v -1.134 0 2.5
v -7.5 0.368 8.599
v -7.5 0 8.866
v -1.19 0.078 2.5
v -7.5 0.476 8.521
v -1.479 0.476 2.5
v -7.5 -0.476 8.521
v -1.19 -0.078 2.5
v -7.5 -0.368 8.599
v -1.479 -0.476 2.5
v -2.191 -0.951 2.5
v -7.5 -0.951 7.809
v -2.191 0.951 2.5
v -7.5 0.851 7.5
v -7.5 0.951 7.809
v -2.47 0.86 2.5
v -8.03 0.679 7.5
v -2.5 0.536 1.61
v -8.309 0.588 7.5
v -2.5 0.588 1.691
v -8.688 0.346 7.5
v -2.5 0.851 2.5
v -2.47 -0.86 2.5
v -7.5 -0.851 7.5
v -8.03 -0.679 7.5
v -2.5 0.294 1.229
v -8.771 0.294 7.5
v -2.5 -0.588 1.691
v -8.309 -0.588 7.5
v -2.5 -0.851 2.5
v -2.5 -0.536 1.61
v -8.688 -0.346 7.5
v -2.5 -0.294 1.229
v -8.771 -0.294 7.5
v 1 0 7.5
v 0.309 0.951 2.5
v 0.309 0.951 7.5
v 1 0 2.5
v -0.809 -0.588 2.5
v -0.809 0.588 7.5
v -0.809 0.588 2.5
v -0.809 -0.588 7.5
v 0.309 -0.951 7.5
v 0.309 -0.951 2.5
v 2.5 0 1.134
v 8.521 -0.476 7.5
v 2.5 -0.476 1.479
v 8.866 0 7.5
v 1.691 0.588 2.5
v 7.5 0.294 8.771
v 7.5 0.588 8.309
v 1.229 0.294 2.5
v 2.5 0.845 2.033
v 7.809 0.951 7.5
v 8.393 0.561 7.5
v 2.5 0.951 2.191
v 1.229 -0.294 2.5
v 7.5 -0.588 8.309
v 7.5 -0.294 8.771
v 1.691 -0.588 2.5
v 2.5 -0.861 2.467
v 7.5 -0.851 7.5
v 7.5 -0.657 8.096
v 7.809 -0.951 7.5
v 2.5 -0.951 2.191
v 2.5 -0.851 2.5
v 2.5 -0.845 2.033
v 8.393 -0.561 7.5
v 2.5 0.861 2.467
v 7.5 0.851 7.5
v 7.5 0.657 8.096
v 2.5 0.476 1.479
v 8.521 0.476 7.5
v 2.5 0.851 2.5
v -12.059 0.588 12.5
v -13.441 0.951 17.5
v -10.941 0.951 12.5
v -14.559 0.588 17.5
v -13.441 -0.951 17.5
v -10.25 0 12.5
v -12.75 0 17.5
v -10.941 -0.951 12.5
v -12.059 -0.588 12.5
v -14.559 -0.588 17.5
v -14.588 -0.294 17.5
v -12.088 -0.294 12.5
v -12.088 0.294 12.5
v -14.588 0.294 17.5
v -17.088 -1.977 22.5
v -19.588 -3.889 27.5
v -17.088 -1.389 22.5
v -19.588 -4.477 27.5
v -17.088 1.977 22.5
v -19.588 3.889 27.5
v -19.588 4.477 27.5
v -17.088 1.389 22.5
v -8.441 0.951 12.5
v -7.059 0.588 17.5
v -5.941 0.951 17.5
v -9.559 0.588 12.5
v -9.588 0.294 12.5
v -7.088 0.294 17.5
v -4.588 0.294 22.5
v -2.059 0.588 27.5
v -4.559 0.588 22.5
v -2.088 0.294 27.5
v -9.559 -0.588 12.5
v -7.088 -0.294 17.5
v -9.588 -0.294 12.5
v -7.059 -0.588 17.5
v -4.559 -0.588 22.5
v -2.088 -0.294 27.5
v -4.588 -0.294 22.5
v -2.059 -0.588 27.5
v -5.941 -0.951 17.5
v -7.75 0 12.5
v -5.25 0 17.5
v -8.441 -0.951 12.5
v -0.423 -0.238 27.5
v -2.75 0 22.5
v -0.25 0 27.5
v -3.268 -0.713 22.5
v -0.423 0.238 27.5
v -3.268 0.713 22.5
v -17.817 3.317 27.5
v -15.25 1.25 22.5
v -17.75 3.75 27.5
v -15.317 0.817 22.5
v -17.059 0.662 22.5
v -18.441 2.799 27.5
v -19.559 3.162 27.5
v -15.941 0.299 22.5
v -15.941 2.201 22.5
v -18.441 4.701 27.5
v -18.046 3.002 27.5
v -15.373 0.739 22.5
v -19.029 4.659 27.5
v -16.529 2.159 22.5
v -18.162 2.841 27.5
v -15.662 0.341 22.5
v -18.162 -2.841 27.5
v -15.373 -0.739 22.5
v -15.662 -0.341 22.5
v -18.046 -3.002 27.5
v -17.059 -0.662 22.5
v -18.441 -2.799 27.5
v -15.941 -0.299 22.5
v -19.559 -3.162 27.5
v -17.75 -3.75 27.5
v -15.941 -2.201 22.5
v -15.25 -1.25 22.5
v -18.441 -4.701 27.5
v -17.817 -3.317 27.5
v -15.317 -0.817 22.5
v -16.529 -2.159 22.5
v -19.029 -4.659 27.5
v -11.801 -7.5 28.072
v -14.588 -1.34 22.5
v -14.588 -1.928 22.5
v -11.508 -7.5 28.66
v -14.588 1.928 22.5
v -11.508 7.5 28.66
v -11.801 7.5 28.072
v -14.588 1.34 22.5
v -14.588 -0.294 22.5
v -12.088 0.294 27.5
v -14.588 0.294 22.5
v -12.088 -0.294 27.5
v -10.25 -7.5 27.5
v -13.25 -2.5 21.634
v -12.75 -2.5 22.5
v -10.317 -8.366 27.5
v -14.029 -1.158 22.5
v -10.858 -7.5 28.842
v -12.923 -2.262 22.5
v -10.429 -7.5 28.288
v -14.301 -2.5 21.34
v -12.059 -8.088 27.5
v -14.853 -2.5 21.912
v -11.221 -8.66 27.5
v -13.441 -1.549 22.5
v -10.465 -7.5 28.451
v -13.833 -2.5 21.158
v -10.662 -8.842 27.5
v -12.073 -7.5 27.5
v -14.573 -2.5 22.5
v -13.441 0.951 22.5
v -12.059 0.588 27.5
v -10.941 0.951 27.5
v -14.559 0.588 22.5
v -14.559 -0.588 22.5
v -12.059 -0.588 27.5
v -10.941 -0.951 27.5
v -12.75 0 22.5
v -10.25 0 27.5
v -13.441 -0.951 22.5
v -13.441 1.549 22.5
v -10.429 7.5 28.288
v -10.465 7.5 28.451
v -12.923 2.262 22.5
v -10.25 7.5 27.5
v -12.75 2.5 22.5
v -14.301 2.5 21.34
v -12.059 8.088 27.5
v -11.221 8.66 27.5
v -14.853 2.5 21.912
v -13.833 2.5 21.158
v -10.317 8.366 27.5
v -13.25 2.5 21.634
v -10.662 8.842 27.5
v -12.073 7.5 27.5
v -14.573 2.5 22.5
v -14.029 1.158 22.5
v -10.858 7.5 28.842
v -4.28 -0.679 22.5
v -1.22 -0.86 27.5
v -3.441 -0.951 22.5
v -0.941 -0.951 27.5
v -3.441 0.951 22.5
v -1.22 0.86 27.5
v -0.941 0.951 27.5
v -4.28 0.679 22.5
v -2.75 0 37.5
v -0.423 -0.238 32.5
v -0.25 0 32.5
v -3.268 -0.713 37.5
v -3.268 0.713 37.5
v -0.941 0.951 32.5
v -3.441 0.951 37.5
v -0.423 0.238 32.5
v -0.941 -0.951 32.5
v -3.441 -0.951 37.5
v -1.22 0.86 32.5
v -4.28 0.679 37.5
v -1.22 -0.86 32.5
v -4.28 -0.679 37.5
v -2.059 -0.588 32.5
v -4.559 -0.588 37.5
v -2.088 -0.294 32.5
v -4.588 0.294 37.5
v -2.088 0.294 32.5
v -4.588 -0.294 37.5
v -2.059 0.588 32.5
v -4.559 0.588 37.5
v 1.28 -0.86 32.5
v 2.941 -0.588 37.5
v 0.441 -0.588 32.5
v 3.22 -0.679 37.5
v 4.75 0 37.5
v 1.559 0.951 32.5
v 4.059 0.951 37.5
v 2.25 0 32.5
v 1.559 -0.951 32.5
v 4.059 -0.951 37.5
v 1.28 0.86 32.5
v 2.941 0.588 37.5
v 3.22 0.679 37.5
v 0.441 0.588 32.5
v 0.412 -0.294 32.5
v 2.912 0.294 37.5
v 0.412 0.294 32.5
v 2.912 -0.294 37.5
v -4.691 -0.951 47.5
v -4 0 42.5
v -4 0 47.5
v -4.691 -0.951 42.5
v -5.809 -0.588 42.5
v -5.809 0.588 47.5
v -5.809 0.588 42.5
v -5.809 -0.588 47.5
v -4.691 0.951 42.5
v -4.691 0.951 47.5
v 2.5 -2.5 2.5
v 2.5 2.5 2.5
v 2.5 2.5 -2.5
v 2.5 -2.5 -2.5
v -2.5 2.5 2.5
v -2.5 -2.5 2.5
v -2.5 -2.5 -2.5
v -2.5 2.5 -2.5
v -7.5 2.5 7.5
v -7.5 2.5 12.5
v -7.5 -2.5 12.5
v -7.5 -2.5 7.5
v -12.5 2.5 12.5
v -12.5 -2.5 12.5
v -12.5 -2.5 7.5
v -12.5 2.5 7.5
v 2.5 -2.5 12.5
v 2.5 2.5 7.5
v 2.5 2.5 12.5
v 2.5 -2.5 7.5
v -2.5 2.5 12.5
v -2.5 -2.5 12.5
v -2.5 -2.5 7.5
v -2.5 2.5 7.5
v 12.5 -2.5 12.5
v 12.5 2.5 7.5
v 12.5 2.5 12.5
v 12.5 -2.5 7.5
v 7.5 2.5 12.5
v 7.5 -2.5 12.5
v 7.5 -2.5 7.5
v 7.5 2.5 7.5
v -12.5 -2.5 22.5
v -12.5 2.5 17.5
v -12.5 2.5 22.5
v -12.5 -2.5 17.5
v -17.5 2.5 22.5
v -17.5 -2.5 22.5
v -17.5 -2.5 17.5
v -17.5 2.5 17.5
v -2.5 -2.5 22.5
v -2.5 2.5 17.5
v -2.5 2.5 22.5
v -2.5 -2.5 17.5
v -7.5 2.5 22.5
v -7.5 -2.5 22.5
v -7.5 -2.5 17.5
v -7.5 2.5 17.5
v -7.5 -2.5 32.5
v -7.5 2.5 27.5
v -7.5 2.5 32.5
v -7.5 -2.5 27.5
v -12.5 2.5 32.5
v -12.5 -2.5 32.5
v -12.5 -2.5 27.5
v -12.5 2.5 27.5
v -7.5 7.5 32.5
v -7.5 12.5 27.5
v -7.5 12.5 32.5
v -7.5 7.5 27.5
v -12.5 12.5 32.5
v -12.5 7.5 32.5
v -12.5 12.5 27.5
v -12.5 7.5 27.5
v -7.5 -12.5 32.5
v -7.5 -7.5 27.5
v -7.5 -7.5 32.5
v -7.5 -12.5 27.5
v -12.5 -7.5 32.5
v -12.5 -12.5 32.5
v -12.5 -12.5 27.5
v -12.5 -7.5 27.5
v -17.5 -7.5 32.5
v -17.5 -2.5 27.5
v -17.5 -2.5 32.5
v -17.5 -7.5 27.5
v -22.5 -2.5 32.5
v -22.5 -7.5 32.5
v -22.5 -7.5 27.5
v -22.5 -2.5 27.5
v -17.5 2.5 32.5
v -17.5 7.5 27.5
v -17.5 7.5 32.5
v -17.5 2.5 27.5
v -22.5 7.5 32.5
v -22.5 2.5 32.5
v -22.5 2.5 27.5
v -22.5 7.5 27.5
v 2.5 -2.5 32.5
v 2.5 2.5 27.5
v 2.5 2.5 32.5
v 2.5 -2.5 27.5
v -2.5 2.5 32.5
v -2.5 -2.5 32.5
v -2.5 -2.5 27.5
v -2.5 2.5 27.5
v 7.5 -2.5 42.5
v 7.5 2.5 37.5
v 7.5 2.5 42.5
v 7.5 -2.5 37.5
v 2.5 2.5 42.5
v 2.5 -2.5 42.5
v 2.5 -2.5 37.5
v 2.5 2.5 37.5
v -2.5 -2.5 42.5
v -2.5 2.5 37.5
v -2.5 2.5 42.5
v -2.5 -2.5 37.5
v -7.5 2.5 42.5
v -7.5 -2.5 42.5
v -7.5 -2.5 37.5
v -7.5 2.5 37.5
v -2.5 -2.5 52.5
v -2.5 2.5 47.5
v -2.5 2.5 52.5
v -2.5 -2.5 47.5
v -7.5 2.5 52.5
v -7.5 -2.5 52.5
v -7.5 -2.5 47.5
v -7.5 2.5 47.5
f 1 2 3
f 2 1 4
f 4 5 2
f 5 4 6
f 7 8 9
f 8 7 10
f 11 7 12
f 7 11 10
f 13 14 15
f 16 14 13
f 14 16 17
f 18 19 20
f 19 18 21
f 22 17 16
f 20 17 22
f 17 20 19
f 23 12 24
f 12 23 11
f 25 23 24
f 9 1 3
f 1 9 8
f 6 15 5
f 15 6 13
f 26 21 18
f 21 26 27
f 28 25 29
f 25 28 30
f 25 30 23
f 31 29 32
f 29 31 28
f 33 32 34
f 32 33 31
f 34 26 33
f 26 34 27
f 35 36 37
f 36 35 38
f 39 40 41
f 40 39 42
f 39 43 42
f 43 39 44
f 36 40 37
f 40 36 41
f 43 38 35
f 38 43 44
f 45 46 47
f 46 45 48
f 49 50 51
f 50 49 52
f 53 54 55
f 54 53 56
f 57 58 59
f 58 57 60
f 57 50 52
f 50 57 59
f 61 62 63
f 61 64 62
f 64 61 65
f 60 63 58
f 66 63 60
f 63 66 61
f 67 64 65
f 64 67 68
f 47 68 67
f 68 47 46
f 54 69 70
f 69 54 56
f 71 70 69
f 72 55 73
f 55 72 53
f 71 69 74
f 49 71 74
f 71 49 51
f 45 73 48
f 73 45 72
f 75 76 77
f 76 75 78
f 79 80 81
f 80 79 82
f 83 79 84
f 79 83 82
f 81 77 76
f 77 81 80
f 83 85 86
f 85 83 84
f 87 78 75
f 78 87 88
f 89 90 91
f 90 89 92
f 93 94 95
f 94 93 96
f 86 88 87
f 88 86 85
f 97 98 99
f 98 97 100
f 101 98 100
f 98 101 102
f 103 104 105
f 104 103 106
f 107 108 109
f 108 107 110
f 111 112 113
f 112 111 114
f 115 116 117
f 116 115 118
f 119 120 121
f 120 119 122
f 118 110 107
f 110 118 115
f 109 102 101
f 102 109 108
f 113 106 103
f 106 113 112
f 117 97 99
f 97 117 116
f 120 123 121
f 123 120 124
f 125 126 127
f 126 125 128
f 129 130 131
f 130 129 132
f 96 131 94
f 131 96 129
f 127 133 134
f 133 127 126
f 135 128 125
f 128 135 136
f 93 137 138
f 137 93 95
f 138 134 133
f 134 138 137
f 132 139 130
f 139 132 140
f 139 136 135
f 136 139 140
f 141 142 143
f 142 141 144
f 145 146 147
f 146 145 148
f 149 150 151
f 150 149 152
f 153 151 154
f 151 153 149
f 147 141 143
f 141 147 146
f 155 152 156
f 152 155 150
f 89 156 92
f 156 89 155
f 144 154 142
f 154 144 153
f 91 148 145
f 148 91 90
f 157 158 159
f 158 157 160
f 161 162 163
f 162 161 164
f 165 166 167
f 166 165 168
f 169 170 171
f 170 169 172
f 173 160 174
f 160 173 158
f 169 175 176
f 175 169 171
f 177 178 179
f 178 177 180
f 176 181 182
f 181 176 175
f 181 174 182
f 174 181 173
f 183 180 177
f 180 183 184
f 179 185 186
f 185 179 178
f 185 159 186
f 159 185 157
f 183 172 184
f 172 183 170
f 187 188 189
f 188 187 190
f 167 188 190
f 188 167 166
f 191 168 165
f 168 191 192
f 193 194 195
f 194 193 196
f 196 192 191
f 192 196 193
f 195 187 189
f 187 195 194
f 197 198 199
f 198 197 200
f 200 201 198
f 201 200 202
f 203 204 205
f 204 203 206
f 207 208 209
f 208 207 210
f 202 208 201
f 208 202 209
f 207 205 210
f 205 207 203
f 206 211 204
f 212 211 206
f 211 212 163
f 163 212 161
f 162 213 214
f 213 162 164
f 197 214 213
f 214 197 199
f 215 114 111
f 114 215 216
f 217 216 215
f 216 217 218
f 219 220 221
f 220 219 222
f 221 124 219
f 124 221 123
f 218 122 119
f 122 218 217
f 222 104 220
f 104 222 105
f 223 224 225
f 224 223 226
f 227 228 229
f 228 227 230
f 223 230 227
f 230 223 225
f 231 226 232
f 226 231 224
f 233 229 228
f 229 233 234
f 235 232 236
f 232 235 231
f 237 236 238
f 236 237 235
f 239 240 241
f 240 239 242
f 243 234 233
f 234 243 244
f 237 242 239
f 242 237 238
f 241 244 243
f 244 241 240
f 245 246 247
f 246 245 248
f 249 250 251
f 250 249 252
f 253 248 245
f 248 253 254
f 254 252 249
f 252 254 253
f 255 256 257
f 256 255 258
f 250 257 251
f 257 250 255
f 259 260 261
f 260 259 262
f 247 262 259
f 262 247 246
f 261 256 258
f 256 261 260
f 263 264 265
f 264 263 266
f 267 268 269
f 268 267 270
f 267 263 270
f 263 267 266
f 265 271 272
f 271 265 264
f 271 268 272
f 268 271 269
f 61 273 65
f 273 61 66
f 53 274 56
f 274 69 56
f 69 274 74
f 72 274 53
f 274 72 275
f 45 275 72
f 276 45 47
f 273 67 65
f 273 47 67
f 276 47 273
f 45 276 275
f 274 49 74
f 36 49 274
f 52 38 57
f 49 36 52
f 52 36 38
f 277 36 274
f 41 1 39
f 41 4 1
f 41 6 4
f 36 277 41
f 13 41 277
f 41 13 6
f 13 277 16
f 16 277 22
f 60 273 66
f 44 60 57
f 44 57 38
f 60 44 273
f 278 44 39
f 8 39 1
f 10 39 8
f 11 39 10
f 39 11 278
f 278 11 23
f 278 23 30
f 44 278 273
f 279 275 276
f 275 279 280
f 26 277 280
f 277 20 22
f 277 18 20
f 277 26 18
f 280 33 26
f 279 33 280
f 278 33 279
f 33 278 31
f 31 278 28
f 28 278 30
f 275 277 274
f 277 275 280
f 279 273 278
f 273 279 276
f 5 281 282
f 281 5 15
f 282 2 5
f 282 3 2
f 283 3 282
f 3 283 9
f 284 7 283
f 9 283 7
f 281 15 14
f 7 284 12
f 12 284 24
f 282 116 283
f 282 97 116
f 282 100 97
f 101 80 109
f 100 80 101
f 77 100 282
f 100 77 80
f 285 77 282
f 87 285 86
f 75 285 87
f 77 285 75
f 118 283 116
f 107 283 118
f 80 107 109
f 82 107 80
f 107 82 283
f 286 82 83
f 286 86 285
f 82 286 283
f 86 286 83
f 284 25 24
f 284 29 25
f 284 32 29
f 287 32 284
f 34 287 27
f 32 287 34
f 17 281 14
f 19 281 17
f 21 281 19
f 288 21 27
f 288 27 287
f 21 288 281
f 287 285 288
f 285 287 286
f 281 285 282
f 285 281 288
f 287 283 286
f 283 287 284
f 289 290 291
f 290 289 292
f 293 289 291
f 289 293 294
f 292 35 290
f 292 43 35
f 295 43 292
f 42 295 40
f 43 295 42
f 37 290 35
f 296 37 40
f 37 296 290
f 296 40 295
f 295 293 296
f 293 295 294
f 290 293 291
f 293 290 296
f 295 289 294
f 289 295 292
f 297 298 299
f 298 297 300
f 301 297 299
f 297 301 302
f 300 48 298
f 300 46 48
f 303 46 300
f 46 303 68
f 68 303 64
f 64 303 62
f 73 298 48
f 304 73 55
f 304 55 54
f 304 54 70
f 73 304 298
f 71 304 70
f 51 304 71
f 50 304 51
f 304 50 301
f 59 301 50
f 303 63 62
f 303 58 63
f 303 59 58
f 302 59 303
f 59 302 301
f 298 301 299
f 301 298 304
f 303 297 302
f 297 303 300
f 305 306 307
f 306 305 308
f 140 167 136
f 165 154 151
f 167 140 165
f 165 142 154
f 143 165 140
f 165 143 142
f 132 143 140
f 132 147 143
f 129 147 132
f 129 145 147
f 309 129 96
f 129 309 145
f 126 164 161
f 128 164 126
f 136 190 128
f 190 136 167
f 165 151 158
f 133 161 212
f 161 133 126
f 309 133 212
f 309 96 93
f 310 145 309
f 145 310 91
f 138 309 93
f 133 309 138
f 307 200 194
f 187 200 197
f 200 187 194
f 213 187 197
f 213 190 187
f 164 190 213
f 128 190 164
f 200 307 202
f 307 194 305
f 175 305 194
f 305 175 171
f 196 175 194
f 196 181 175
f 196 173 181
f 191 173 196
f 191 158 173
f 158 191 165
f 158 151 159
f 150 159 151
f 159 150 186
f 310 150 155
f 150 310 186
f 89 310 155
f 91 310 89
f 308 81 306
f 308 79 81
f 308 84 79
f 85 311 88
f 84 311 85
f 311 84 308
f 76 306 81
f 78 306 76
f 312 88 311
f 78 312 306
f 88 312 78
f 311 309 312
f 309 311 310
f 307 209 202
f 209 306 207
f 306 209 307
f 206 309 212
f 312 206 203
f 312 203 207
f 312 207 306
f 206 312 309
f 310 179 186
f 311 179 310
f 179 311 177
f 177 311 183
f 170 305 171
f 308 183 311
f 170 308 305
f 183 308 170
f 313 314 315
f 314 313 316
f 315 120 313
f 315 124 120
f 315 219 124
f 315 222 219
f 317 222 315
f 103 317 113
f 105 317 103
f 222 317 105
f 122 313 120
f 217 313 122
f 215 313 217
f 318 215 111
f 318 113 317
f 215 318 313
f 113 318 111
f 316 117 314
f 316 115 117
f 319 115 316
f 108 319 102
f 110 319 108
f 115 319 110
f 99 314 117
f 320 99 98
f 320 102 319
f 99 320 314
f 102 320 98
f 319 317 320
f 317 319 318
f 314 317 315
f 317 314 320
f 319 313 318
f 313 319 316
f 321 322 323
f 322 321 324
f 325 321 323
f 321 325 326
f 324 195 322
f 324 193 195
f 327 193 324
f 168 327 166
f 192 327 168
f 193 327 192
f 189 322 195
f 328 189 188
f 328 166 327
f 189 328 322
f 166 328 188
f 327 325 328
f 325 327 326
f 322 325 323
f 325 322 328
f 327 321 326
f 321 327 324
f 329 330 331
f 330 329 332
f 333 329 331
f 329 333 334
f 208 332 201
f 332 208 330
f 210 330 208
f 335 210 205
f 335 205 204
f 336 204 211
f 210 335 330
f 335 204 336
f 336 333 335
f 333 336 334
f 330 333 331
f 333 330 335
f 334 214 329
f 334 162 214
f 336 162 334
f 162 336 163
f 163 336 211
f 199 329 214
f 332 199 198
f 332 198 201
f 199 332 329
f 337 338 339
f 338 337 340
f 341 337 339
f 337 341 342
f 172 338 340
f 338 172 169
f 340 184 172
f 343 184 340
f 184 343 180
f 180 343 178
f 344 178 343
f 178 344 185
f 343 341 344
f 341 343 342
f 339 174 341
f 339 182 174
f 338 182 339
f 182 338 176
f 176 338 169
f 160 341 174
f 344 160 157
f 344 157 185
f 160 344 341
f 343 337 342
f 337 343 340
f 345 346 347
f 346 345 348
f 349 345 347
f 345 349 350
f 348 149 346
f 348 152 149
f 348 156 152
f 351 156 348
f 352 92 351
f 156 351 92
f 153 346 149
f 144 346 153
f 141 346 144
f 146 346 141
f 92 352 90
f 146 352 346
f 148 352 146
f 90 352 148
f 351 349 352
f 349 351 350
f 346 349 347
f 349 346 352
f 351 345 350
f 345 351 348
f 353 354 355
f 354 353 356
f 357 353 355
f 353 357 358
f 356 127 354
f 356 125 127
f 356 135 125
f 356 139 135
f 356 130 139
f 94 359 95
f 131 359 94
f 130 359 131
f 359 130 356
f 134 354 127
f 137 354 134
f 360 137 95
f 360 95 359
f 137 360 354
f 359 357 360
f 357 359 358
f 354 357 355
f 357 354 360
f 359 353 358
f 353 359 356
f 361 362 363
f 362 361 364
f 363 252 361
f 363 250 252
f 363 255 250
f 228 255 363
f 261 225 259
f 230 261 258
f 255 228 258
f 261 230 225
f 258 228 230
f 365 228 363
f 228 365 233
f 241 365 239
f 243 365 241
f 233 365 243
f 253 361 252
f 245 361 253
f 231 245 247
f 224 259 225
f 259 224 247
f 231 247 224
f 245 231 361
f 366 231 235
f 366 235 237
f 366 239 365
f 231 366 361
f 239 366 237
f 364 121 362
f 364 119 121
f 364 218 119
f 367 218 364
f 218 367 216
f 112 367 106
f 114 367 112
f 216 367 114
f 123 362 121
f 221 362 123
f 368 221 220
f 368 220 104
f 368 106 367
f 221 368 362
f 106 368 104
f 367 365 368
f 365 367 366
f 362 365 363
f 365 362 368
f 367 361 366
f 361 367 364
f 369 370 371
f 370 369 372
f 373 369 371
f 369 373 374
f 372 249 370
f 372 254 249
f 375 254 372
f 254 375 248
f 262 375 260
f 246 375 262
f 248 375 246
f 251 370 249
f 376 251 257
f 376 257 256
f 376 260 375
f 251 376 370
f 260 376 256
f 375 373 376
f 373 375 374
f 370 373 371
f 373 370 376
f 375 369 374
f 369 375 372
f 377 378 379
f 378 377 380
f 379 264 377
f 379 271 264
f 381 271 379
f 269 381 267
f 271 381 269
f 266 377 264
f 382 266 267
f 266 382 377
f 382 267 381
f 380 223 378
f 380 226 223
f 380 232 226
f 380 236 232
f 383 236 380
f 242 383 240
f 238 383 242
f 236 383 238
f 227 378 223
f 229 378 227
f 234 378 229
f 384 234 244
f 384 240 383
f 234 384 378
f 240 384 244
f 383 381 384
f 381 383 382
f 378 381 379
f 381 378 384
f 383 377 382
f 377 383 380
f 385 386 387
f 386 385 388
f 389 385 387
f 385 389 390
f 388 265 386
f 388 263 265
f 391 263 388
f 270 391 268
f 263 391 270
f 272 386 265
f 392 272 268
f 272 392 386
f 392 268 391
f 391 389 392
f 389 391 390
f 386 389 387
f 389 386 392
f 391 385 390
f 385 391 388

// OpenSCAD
$vpr=[100,0,20];
$vpt=[0,0,23];
$vpd=160;

color("#DD0"){cube(5,true);}

translate([-10,0,10]){color("#0FF"){cube(5,true);}}

translate([0,0,10]){color("#F00"){cube(5,true);}}

translate([10,0,10]){color("#F00"){cube(5,true);}}

translate([-15,0,20]){color("#0FF"){cube(5,true);}}

translate([-5,0,20]){color("#0FF"){cube(5,true);}}


translate([-10,0,30]){color("#F00"){cube(5,true);}}

translate([-10,10,30]){color("#F00"){cube(5,true);}}

translate([-10,-10,30]){color("#F00"){cube(5,true);}}

translate([-20,-5,30]){color("#F00"){cube(5,true);}}

translate([-20,5,30]){color("#F00"){cube(5,true);}}



translate([0,0,30]){color("#0FF"){cube(5,true);}}

translate([5,0,40]){color("#F00"){cube(5,true);}}

translate([-5,0,40]){color("#0FF"){cube(5,true);}}

translate([-5,0,50]){color("#4A4"){cube(5,true);}}


color("#0FF"){

hull(){
sphere(1);
translate([-10,0,10]){sphere(1);}
}

hull(){
sphere(1);
translate([0,0,10]){sphere(1);}
}

hull(){
sphere(1);
translate([10,0,10]){sphere(1);}
}

hull(){
translate([-10,0,10]){sphere(1);}
translate([-15,0,20]){sphere(1);}
}

hull(){
translate([-10,0,10]){sphere(1);}
translate([-5,0,20]){sphere(1);}
}

hull(){
translate([-10,0,10]){sphere(1);}
translate([-5,0,20]){sphere(1);}
}



hull(){
translate([-15,0,20]){sphere(1);}
translate([-20,5,30]){sphere(1);}
}
hull(){
translate([-15,0,20]){sphere(1);}
translate([-20,-5,30]){sphere(1);}
}
hull(){
translate([-15,0,20]){sphere(1);}
translate([-10,-10,30]){sphere(1);}
}
hull(){
translate([-15,0,20]){sphere(1);}
translate([-10,0,30]){sphere(1);}
}
hull(){
translate([-15,0,20]){sphere(1);}
translate([-10,10,30]){sphere(1);}
}

hull(){
translate([-5,0,20]){sphere(1);}
translate([0,0,30]){sphere(1);}
}

hull(){
translate([0,0,30]){sphere(1);}
translate([-5,0,40]){sphere(1);}
}
hull(){
translate([0,0,30]){sphere(1);}
translate([5,0,40]){sphere(1);}
}

hull(){
translate([-5,0,40]){sphere(1);}

//openscad versioning.scad -o versioning.png --colorscheme=Starnight --imgsize=1000,1000
translate([-5,0,50]){sphere(1);}
}

}
